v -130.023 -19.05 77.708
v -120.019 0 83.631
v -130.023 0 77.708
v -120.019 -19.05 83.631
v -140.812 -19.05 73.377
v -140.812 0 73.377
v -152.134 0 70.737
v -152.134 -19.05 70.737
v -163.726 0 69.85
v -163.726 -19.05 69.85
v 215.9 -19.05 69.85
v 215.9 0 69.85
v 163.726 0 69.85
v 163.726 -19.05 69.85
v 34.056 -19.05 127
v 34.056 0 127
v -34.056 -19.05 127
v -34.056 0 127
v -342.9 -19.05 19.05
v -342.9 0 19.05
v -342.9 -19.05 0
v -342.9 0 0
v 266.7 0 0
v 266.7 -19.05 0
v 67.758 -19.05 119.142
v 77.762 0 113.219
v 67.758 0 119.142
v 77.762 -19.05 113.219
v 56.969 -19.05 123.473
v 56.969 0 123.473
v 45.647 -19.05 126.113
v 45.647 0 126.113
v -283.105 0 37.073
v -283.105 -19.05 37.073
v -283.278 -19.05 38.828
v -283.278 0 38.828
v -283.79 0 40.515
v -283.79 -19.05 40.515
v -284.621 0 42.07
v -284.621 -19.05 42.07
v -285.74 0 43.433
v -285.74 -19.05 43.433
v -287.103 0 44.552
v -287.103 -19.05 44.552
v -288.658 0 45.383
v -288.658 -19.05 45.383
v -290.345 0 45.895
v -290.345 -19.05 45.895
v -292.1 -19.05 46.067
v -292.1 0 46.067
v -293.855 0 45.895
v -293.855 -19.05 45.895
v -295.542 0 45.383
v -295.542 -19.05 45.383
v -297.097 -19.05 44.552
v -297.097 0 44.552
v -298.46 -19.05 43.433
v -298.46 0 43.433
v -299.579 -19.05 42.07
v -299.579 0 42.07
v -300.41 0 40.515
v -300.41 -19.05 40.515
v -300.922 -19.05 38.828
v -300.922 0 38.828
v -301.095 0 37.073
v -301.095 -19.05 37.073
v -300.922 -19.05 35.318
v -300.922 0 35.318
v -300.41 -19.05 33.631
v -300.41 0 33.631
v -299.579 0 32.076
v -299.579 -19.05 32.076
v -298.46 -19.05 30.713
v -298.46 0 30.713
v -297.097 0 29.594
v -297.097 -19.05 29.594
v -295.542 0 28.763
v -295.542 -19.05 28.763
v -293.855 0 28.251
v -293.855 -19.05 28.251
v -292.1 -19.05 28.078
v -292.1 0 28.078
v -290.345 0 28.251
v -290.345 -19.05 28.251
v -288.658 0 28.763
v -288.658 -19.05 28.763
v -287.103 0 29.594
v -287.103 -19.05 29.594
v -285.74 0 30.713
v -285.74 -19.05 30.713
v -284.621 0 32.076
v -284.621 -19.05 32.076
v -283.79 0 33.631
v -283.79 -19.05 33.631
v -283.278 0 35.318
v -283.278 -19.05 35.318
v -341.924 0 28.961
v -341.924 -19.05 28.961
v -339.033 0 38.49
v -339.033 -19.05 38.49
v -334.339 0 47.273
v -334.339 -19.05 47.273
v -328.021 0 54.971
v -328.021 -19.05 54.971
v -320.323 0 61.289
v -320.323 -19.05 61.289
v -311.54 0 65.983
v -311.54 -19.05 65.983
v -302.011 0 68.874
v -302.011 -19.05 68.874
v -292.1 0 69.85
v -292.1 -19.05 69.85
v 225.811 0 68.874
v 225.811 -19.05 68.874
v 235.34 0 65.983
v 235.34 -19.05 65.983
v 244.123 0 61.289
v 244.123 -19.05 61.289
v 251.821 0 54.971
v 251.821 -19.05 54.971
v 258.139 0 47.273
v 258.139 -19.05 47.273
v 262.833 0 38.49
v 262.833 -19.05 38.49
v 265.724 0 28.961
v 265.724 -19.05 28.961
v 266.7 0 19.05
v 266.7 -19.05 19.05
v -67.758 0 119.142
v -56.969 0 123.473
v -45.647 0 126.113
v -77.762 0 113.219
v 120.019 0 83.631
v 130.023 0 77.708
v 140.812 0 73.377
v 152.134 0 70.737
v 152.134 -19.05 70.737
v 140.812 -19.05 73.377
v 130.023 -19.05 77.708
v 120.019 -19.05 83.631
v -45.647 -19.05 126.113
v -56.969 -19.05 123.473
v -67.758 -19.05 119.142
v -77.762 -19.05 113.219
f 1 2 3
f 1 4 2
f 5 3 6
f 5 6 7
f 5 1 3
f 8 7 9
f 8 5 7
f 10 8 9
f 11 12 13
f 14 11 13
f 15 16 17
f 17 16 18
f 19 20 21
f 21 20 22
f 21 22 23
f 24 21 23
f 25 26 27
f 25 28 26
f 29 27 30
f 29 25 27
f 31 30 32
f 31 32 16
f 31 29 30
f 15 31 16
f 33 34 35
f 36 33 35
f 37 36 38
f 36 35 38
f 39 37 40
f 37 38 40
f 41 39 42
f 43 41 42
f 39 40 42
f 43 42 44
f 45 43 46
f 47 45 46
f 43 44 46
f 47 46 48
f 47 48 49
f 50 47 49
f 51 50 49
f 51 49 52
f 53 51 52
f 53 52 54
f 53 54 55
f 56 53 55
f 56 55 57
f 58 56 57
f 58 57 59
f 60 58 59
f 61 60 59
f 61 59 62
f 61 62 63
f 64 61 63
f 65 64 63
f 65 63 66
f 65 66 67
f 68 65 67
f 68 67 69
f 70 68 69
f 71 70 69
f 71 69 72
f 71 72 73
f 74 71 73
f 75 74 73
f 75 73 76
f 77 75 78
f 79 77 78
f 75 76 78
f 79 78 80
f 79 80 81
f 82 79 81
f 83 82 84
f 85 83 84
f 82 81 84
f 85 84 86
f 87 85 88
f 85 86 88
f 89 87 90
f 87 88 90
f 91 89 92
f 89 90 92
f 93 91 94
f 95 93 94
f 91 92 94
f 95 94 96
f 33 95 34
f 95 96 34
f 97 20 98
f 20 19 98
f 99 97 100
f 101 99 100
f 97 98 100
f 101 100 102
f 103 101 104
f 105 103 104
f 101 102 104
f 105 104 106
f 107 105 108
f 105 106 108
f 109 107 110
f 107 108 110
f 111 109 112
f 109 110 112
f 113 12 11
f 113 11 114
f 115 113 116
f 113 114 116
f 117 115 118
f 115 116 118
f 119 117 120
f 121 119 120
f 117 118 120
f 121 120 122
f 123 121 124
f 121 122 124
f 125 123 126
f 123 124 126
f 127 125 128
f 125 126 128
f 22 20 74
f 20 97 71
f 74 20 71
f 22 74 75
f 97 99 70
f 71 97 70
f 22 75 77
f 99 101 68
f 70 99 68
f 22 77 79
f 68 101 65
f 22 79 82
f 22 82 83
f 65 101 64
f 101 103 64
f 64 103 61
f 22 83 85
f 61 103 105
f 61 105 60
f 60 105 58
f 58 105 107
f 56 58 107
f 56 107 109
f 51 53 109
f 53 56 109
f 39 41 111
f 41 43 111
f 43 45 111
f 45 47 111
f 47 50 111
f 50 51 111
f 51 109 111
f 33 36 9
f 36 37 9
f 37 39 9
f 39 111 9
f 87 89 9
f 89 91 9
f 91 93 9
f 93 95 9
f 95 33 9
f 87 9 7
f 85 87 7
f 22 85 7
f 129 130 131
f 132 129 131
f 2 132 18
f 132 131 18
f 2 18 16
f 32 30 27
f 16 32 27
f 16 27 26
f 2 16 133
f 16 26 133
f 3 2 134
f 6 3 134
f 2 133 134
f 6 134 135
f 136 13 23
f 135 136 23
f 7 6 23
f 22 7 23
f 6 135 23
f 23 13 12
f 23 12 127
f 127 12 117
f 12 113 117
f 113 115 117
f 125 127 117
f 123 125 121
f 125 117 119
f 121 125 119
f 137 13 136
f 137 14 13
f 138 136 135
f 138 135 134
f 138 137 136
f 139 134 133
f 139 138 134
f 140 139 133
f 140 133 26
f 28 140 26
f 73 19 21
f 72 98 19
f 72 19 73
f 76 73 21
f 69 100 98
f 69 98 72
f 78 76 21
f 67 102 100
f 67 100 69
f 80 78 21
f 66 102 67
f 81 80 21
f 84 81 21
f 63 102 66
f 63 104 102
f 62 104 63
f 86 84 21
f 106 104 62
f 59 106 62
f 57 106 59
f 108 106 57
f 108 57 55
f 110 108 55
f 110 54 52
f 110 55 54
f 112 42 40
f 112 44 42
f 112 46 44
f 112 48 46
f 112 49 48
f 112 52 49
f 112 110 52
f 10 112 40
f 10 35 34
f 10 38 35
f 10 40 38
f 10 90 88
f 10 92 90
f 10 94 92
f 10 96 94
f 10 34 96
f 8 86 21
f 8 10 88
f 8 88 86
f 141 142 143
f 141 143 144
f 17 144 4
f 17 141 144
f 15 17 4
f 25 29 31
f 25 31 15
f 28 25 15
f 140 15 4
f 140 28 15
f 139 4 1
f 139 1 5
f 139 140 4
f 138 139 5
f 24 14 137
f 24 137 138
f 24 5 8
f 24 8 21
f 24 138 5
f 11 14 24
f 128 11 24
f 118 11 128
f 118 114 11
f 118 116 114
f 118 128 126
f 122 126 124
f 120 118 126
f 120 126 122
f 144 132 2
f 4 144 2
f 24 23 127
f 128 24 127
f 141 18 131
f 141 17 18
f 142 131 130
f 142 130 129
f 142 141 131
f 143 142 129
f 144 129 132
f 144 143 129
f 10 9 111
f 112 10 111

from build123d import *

# Parameters (mm, degrees)
F1_DEPTH = 19.05
F2_R     = 76.2
F3_R     = 50.8
F4_R     = 8.994508
F5_DEPTH = 25.4


with BuildPart() as f1:
    # F0 (on Front) → F1 (new body)
    with BuildSketch(Plane.XZ):
        Polygon((-342.9, 69.85), (-342.9, 0), (266.7, 0), (266.7, 69.85), (139.7, 69.85), (58.081341, 127), (-58.081341, 127), (-139.7, 69.85), align=None)
    extrude(amount=F1_DEPTH)

    # F2
    f2_edges = [f1.edges().sort_by_distance(p)[0] for p in [
        (139.7, -9.525, 69.85),
        (58.081341, -9.525, 127),
        (-58.081341, -9.525, 127),
        (-139.7, -9.525, 69.85),
    ]]
    fillet(f2_edges, radius=F2_R)

    # F3
    f3_edges = [f1.edges().sort_by_distance(p)[0] for p in [
        (266.7, -9.525, 69.85),
        (-342.9, -9.525, 69.85),
    ]]
    fillet(f3_edges, radius=F3_R)

    # F4 (on face) → F5 (cut)
    with BuildSketch(Plane.XZ.offset(19.05)):
        with Locations((-292.1, 37.072986)):
            Circle(F4_R)
    extrude(amount=-F5_DEPTH, mode=Mode.SUBTRACT)


solid = f1.part
